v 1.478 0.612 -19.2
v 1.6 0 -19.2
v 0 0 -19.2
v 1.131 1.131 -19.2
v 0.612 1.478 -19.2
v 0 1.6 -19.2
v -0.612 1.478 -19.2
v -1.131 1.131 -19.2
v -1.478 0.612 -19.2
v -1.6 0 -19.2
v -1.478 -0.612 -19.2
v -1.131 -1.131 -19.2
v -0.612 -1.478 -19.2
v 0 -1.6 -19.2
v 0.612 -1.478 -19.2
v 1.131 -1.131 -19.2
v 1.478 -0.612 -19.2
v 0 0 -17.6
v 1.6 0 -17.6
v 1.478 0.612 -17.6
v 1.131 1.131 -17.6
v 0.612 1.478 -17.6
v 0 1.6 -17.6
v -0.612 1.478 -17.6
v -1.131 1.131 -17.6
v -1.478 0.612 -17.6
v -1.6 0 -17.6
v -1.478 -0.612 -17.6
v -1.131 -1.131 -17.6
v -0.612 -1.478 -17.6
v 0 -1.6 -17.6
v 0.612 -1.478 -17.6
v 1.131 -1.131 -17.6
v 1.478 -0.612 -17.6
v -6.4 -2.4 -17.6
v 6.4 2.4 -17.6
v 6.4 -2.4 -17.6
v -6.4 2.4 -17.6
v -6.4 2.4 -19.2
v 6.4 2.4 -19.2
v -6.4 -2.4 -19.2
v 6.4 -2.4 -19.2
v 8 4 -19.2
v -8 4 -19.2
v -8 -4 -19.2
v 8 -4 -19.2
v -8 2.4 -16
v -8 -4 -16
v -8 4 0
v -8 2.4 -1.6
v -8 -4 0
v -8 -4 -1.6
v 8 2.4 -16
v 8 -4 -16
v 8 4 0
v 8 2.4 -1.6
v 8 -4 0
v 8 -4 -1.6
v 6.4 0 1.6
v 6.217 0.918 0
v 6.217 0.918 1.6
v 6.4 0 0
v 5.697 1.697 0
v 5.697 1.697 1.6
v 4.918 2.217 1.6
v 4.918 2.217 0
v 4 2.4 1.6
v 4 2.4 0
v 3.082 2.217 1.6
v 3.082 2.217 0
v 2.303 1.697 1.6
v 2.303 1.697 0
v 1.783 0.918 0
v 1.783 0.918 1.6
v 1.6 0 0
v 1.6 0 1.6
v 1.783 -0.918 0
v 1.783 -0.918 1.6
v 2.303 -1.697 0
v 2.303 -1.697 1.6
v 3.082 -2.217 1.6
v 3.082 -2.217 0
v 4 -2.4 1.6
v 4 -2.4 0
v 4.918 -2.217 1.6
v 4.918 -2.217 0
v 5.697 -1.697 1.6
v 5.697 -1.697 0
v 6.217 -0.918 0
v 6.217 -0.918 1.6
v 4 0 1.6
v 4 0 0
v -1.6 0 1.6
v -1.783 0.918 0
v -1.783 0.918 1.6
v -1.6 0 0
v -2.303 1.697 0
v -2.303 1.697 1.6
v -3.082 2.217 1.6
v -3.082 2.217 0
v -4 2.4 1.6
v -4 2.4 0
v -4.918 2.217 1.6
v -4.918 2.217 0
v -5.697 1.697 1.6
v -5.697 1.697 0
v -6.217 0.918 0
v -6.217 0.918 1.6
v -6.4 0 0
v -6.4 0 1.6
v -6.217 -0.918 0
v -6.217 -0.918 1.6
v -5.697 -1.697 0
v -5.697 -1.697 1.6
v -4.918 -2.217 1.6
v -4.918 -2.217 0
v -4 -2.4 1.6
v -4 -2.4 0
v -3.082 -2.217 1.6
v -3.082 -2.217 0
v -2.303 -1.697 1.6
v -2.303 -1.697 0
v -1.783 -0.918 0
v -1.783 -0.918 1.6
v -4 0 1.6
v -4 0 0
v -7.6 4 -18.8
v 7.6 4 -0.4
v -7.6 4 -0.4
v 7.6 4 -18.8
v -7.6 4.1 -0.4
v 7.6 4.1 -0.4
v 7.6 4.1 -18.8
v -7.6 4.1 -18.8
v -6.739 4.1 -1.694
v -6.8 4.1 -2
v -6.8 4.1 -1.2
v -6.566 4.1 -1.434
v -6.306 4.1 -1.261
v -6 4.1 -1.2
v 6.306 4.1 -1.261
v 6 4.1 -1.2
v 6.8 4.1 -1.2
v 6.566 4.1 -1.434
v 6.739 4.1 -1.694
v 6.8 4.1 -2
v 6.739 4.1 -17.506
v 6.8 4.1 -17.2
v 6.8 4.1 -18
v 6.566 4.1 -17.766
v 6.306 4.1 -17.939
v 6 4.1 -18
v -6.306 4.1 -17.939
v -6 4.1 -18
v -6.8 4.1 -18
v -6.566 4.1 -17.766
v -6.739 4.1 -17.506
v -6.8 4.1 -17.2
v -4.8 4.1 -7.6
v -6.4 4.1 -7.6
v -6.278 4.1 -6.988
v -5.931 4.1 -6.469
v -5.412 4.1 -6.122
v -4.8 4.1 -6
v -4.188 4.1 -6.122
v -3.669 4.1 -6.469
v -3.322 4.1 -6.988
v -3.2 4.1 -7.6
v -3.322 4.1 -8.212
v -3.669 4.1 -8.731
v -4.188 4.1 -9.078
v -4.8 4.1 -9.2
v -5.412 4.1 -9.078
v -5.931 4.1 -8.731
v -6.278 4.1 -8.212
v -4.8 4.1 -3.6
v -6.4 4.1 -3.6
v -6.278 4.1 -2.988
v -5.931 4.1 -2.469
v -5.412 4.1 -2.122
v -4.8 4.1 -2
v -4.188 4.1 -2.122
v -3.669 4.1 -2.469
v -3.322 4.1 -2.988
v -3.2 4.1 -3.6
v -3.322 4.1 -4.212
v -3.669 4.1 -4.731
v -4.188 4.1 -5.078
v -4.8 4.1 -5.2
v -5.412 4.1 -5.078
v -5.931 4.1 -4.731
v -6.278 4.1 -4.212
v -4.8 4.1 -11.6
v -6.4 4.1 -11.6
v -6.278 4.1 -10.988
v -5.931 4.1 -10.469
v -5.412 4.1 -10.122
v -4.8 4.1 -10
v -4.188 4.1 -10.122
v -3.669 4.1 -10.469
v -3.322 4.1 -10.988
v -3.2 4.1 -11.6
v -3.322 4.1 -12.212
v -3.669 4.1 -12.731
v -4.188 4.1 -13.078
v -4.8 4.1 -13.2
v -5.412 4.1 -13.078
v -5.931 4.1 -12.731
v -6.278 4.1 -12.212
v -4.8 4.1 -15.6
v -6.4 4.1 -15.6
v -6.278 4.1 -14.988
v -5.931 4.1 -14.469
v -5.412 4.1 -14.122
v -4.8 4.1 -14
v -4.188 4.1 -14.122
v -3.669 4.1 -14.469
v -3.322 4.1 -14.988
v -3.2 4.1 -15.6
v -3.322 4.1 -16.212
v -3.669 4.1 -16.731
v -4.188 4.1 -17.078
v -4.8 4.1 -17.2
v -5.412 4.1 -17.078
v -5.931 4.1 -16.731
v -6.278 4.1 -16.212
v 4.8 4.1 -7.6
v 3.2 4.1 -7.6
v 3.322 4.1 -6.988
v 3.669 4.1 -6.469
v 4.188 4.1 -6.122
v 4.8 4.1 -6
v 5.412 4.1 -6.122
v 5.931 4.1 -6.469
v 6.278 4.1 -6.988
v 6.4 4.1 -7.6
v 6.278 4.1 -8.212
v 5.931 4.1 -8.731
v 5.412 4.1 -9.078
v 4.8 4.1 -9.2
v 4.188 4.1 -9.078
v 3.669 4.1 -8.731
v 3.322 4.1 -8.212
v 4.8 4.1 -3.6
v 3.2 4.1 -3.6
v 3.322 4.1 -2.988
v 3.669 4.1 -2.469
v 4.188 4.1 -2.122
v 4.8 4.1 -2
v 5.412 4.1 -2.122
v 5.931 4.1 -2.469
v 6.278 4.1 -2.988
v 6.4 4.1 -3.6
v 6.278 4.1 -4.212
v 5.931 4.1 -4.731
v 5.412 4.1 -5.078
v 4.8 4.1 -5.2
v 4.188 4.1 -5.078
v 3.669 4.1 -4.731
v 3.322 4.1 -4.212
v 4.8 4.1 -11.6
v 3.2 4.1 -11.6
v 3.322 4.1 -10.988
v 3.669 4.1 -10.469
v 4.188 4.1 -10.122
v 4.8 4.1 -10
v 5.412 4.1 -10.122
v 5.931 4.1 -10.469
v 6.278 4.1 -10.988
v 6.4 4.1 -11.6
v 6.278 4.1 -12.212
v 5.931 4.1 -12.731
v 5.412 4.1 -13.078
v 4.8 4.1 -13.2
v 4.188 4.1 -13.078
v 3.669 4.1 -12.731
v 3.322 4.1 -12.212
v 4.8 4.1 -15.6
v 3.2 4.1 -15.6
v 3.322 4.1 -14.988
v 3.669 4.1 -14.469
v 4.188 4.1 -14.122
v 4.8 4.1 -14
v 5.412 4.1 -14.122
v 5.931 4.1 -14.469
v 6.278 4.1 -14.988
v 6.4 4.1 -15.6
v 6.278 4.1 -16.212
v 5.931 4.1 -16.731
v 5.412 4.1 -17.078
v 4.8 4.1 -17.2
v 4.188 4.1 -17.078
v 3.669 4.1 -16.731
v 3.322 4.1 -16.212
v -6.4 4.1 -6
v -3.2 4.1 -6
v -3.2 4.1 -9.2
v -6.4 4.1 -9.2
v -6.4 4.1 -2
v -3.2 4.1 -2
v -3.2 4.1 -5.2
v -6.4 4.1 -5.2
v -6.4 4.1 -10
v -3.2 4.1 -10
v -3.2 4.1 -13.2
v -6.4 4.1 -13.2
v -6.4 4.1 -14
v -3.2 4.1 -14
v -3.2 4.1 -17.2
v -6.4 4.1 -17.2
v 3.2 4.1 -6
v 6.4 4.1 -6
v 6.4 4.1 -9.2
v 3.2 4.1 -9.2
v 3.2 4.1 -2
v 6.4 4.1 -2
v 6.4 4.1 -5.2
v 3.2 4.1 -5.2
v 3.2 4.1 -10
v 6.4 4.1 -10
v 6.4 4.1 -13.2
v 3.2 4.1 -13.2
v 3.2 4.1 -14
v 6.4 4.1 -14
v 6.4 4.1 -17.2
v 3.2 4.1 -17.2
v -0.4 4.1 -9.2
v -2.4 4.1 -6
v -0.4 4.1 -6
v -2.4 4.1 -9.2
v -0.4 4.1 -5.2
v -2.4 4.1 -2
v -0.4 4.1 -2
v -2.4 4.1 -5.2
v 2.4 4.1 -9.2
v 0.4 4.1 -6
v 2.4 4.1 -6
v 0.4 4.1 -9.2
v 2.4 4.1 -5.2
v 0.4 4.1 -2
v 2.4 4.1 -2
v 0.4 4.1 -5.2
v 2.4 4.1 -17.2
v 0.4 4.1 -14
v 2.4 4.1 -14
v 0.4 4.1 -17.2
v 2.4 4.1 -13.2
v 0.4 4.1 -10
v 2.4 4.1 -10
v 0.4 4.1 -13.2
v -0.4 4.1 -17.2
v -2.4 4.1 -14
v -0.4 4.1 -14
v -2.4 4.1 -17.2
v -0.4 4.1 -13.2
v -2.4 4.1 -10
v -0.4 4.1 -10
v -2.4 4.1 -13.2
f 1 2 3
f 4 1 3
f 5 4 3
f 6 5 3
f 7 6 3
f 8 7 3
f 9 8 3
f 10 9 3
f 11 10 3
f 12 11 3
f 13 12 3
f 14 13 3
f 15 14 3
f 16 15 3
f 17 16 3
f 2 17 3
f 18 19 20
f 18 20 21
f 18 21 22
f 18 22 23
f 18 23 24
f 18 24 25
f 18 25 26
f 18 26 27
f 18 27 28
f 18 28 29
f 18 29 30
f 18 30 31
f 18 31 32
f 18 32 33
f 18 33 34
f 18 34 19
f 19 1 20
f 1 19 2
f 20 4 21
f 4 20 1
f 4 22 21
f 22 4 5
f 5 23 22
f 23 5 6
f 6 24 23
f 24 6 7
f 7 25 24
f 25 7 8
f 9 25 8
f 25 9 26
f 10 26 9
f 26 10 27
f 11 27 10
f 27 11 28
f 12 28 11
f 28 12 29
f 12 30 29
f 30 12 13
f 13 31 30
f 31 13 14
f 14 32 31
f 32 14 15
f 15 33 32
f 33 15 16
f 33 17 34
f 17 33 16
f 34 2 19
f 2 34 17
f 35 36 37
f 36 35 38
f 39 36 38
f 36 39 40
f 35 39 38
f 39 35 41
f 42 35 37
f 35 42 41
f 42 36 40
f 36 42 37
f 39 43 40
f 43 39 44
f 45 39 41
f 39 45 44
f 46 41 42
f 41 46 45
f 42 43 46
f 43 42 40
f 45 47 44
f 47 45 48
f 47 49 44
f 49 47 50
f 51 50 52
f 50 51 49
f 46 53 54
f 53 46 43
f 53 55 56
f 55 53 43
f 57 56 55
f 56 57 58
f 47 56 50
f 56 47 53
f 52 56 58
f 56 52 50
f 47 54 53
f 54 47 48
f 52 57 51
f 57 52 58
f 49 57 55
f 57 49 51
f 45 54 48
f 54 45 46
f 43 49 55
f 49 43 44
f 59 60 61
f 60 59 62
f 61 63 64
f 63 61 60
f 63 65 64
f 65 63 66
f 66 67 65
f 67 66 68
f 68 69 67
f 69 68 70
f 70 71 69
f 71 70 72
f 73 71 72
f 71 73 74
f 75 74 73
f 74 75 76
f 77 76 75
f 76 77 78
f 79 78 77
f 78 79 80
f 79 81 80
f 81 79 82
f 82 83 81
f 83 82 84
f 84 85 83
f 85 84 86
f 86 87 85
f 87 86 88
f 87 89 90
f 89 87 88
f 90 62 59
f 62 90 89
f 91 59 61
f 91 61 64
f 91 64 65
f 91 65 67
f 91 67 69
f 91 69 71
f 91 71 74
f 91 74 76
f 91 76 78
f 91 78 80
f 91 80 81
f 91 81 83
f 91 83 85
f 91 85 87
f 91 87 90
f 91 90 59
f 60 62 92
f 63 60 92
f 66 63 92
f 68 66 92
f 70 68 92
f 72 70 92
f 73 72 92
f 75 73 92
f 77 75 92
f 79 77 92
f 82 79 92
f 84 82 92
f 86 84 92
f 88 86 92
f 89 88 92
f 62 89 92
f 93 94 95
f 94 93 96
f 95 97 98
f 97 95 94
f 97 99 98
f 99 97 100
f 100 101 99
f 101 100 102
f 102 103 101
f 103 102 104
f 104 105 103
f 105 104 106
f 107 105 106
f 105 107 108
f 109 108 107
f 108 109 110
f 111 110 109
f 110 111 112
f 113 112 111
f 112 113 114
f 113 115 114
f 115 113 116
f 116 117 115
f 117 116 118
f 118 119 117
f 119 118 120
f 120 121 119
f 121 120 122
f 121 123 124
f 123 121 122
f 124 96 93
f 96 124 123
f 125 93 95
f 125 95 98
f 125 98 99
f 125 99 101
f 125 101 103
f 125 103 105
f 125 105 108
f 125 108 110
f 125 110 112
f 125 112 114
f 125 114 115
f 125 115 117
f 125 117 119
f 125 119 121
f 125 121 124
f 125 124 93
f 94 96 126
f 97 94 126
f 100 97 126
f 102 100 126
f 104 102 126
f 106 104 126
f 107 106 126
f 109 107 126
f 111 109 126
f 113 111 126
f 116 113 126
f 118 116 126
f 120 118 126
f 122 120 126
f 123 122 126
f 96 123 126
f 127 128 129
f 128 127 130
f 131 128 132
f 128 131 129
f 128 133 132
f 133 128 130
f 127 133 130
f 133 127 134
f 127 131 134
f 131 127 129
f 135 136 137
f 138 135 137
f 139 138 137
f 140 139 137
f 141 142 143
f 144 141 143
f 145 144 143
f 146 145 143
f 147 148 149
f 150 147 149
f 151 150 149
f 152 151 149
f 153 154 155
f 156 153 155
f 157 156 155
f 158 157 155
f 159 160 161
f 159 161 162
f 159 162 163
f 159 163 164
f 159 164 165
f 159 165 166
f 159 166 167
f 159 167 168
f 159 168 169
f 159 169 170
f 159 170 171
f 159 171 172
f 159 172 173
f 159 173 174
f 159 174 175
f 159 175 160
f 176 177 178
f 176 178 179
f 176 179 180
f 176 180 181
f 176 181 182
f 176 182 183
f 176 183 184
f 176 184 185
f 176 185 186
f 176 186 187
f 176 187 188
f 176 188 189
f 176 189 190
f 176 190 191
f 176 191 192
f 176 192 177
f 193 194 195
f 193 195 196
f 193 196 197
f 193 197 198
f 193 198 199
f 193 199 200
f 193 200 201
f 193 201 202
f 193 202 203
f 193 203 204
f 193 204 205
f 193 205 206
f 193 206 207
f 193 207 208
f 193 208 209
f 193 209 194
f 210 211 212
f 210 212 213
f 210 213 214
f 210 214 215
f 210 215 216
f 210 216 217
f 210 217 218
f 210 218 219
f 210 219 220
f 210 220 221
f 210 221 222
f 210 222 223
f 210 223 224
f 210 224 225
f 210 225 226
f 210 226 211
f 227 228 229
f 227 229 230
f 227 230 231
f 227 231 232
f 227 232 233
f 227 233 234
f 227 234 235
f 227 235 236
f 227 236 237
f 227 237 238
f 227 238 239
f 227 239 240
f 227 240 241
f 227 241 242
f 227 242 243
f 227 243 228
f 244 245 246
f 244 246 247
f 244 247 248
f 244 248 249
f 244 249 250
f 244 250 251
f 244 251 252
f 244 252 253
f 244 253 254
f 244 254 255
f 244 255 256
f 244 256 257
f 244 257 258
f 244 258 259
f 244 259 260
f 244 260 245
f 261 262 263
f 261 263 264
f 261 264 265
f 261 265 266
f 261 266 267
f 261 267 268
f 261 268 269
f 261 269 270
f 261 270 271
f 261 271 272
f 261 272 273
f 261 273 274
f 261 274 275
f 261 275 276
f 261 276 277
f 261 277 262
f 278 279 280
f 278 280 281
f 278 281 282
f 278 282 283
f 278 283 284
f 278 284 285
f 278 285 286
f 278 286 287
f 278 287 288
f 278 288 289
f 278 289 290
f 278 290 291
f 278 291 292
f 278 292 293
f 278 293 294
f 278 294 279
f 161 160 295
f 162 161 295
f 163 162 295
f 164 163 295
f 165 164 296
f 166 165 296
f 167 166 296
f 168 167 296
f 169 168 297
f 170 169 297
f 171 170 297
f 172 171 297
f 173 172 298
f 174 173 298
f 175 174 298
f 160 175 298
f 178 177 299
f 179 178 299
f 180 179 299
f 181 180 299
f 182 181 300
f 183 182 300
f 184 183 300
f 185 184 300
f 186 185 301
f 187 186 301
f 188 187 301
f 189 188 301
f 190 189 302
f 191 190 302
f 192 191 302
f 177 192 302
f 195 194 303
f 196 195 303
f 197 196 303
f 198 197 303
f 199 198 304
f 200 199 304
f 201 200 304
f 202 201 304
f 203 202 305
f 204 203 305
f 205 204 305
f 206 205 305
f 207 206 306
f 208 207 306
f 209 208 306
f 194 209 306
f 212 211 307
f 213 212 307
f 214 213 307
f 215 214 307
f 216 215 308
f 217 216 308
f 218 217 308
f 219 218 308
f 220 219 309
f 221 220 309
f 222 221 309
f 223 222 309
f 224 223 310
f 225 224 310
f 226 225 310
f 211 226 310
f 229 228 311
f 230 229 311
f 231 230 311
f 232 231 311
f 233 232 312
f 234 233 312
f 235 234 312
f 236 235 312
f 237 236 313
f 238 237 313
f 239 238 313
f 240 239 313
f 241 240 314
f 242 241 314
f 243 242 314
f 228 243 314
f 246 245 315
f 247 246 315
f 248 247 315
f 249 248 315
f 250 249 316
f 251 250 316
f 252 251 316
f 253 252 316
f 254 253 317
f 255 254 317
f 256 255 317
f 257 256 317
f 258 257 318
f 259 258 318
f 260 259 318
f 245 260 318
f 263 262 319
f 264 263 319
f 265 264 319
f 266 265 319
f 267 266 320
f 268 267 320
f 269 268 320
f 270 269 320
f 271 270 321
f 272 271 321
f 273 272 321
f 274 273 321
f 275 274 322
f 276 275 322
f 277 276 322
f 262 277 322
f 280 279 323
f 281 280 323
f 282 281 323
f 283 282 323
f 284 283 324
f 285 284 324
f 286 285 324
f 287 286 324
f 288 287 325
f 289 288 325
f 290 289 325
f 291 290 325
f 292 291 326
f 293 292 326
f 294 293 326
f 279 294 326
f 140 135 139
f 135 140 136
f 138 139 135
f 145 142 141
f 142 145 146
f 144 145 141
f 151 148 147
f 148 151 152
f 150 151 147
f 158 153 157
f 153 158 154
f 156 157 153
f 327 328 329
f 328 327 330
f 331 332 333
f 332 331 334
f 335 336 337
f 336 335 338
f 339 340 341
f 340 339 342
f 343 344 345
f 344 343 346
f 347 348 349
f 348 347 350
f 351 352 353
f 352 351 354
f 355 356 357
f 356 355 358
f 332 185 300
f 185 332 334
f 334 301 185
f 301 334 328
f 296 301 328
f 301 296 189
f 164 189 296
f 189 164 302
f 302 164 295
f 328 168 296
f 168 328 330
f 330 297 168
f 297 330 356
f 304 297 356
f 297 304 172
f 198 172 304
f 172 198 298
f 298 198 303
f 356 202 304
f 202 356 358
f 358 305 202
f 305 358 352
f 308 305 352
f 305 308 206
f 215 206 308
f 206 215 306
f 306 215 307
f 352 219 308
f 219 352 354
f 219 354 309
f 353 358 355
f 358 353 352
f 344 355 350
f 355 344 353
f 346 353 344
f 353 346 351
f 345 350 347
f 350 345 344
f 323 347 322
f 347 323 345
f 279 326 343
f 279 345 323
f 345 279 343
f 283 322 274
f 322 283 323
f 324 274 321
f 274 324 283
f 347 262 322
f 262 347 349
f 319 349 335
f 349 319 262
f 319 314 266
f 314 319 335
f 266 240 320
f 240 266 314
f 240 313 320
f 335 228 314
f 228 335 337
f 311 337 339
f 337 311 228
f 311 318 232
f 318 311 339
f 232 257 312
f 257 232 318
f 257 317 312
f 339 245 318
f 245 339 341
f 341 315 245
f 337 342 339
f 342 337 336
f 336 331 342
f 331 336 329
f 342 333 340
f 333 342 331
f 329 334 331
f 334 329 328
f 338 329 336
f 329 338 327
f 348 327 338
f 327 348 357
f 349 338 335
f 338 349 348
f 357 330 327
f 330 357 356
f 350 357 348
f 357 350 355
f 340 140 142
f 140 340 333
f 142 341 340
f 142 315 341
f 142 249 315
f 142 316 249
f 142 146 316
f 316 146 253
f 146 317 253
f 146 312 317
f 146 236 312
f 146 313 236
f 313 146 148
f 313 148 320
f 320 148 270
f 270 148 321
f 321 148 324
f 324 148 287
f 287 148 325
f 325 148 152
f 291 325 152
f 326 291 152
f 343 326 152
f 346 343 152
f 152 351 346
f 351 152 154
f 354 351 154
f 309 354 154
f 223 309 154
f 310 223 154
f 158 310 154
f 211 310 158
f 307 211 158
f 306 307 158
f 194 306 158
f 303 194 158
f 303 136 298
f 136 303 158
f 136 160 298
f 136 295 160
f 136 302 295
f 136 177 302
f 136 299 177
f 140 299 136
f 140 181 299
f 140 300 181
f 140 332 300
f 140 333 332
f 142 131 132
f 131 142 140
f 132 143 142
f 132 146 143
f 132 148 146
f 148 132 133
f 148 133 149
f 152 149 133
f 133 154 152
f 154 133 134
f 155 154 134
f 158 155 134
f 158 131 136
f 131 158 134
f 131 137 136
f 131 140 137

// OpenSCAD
// file: ../p/4-4edge.scad
use <../lib.scad>
function ldraw_lib__4_4edge() = [
// 0 Circle 1.0
// 0 Name: 4-4edge.dat
// 0 Author: James Jessiman
// 0 !LDRAW_ORG Primitive UPDATE 2017-01
// 0 !LICENSE Licensed under CC BY 2.0 and CC BY 4.0 : see CAreadme.txt
// 
// 0 BFC CERTIFY CCW
  [0,"BFC","CERTIFY"],
  [0,"BFC","CCW"],
// 
// 0 !HISTORY 1998-12-15 [PTadmin] Official Update 1998-10
// 0 !HISTORY 2005-12-28 [PTadmin] Official Update 2005-01
// 0 !HISTORY 2007-06-24 [PTadmin] Header formatted for Contributor Agreement
// 0 !HISTORY 2008-07-01 [PTadmin] Official Update 2008-01
// 0 !HISTORY 2017-01-15 [Steffen] BFCed
// 0 !HISTORY 2017-12-30 [PTadmin] Official Update 2017-01
// 
// 
// 2 24 1 0 0 0.9239 0 0.3827
  [2,24,1,0,0,0.9239,0,0.3827],
// 2 24 0.9239 0 0.3827 0.7071 0 0.7071
  [2,24,0.9239,0,0.3827,0.7071,0,0.7071],
// 2 24 0.7071 0 0.7071 0.3827 0 0.9239
  [2,24,0.7071,0,0.7071,0.3827,0,0.9239],
// 2 24 0.3827 0 0.9239 0 0 1
  [2,24,0.3827,0,0.9239,0,0,1],
// 2 24 0 0 1 -0.3827 0 0.9239
  [2,24,0,0,1,-0.3827,0,0.9239],
// 2 24 -0.3827 0 0.9239 -0.7071 0 0.7071
  [2,24,-0.3827,0,0.9239,-0.7071,0,0.7071],
// 2 24 -0.7071 0 0.7071 -0.9239 0 0.3827
  [2,24,-0.7071,0,0.7071,-0.9239,0,0.3827],
// 2 24 -0.9239 0 0.3827 -1 0 -0
  [2,24,-0.9239,0,0.3827,-1,0,-0],
// 2 24 -1 0 -0 -0.9239 0 -0.3827
  [2,24,-1,0,-0,-0.9239,0,-0.3827],
// 2 24 -0.9239 0 -0.3827 -0.7071 0 -0.7071
  [2,24,-0.9239,0,-0.3827,-0.7071,0,-0.7071],
// 2 24 -0.7071 0 -0.7071 -0.3827 0 -0.9239
  [2,24,-0.7071,0,-0.7071,-0.3827,0,-0.9239],
// 2 24 -0.3827 0 -0.9239 0 0 -1
  [2,24,-0.3827,0,-0.9239,0,0,-1],
// 2 24 0 0 -1 0.3827 0 -0.9239
  [2,24,0,0,-1,0.3827,0,-0.9239],
// 2 24 0.3827 0 -0.9239 0.7071 0 -0.7071
  [2,24,0.3827,0,-0.9239,0.7071,0,-0.7071],
// 2 24 0.7071 0 -0.7071 0.9239 0 -0.3827
  [2,24,0.7071,0,-0.7071,0.9239,0,-0.3827],
// 2 24 0.9239 0 -0.3827 1 0 0
  [2,24,0.9239,0,-0.3827,1,0,0],
];
module ldraw_lib__4_4edge(step=0, col=false, unit=2/5, alt=false, line=0.2, solid=!$preview)
    makepoly(ldraw_lib__4_4edge(), step=step, col=col, unit=unit, alt=alt, line=line, solid=solid);
ldraw_lib__4_4edge(line=0.2);
// file: ../p/4-4cyli.scad
use <../lib.scad>
$fa=1; $fs=0.2;
function ldraw_lib__4_4cyli(realsolid=false) = [
// 0 Cylinder 1.0
// 0 Name: 4-4cyli.dat
// 0 Author: James Jessiman
// 0 !LDRAW_ORG Primitive UPDATE 2005-01
// 0 !LICENSE Licensed under CC BY 2.0 and CC BY 4.0 : see CAreadme.txt
// 
// 0 BFC CERTIFY CCW
  [0,"BFC","CERTIFY"],
  [0,"BFC","CCW"],
// 
// 0 !HISTORY 1998-12-15 [PTadmin] Official Update 1998-10
// 0 !HISTORY 2002-03-23 [sbliss] Added BFC statement; merged headers from files in distributions LDraw 0.27 and Complete.
// 0 !HISTORY 2002-04-25 [PTadmin] Official Update 2002-02
// 0 !HISTORY 2004-12-14 [guyvivan] BFC CCW
// 0 !HISTORY 2005-12-28 [PTadmin] Official Update 2005-01
// 0 !HISTORY 2007-06-24 [PTadmin] Header formatted for Contributor Agreement
// 0 !HISTORY 2008-07-01 [PTadmin] Official Update 2008-01
// 
// 
// 4 16 1 1 0 0.9239 1 0.3827 0.9239 0 0.3827 1 0 0
  [4,16,1,1,0,0.9239,1,0.3827,0.9239,0,0.3827,1,0,0],
// 5 24 1 0 0 1 1 0 0.9239 0 0.3827 0.9239 0 -0.3827
  [5,24,1,0,0,1,1,0,0.9239,0,0.3827,0.9239,0,-0.3827],
// 4 16 0.9239 1 0.3827 0.7071 1 0.7071 0.7071 0 0.7071 0.9239 0 0.3827
  [4,16,0.9239,1,0.3827,0.7071,1,0.7071,0.7071,0,0.7071,0.9239,0,0.3827],
// 5 24 0.9239 0 0.3827 0.9239 1 0.3827 0.7071 0 0.7071 1 0 0
  [5,24,0.9239,0,0.3827,0.9239,1,0.3827,0.7071,0,0.7071,1,0,0],
// 4 16 0.7071 1 0.7071 0.3827 1 0.9239 0.3827 0 0.9239 0.7071 0 0.7071
  [4,16,0.7071,1,0.7071,0.3827,1,0.9239,0.3827,0,0.9239,0.7071,0,0.7071],
// 5 24 0.7071 0 0.7071 0.7071 1 0.7071 0.3827 0 0.9239 0.9239 0 0.3827
  [5,24,0.7071,0,0.7071,0.7071,1,0.7071,0.3827,0,0.9239,0.9239,0,0.3827],
// 4 16 0.3827 1 0.9239 0 1 1 0 0 1 0.3827 0 0.9239
  [4,16,0.3827,1,0.9239,0,1,1,0,0,1,0.3827,0,0.9239],
// 5 24 0.3827 0 0.9239 0.3827 1 0.9239 0 0 1 0.7071 0 0.7071
  [5,24,0.3827,0,0.9239,0.3827,1,0.9239,0,0,1,0.7071,0,0.7071],
// 4 16 0 1 1 -0.3827 1 0.9239 -0.3827 0 0.9239 0 0 1
  [4,16,0,1,1,-0.3827,1,0.9239,-0.3827,0,0.9239,0,0,1],
// 5 24 0 0 1 0 1 1 -0.3827 0 0.9239 0.3827 0 0.9239
  [5,24,0,0,1,0,1,1,-0.3827,0,0.9239,0.3827,0,0.9239],
// 4 16 -0.3827 1 0.9239 -0.7071 1 0.7071 -0.7071 0 0.7071 -0.3827 0 0.9239
  [4,16,-0.3827,1,0.9239,-0.7071,1,0.7071,-0.7071,0,0.7071,-0.3827,0,0.9239],
// 5 24 -0.3827 0 0.9239 -0.3827 1 0.9239 -0.7071 0 0.7071 0 0 1
  [5,24,-0.3827,0,0.9239,-0.3827,1,0.9239,-0.7071,0,0.7071,0,0,1],
// 4 16 -0.7071 1 0.7071 -0.9239 1 0.3827 -0.9239 0 0.3827 -0.7071 0 0.7071
  [4,16,-0.7071,1,0.7071,-0.9239,1,0.3827,-0.9239,0,0.3827,-0.7071,0,0.7071],
// 5 24 -0.7071 0 0.7071 -0.7071 1 0.7071 -0.9239 0 0.3827 -0.3827 0 0.9239
  [5,24,-0.7071,0,0.7071,-0.7071,1,0.7071,-0.9239,0,0.3827,-0.3827,0,0.9239],
// 4 16 -0.9239 1 0.3827 -1 1 0 -1 0 0 -0.9239 0 0.3827
  [4,16,-0.9239,1,0.3827,-1,1,0,-1,0,0,-0.9239,0,0.3827],
// 5 24 -0.9239 0 0.3827 -0.9239 1 0.3827 -1 0 0 -0.7071 0 0.7071
  [5,24,-0.9239,0,0.3827,-0.9239,1,0.3827,-1,0,0,-0.7071,0,0.7071],
// 4 16 -1 1 0 -0.9239 1 -0.3827 -0.9239 0 -0.3827 -1 0 0
  [4,16,-1,1,0,-0.9239,1,-0.3827,-0.9239,0,-0.3827,-1,0,0],
// 5 24 -1 0 0 -1 1 0 -0.9239 0 -0.3827 -0.9239 0 0.3827
  [5,24,-1,0,0,-1,1,0,-0.9239,0,-0.3827,-0.9239,0,0.3827],
// 4 16 -0.9239 1 -0.3827 -0.7071 1 -0.7071 -0.7071 0 -0.7071 -0.9239 0 -0.3827
  [4,16,-0.9239,1,-0.3827,-0.7071,1,-0.7071,-0.7071,0,-0.7071,-0.9239,0,-0.3827],
// 5 24 -0.9239 0 -0.3827 -0.9239 1 -0.3827 -0.7071 0 -0.7071 -1 0 0
  [5,24,-0.9239,0,-0.3827,-0.9239,1,-0.3827,-0.7071,0,-0.7071,-1,0,0],
// 4 16 -0.7071 1 -0.7071 -0.3827 1 -0.9239 -0.3827 0 -0.9239 -0.7071 0 -0.7071
  [4,16,-0.7071,1,-0.7071,-0.3827,1,-0.9239,-0.3827,0,-0.9239,-0.7071,0,-0.7071],
// 5 24 -0.7071 0 -0.7071 -0.7071 1 -0.7071 -0.3827 0 -0.9239 -0.9239 0 -0.3827
  [5,24,-0.7071,0,-0.7071,-0.7071,1,-0.7071,-0.3827,0,-0.9239,-0.9239,0,-0.3827],
// 4 16 -0.3827 1 -0.9239 0 1 -1 0 0 -1 -0.3827 0 -0.9239
  [4,16,-0.3827,1,-0.9239,0,1,-1,0,0,-1,-0.3827,0,-0.9239],
// 5 24 -0.3827 0 -0.9239 -0.3827 1 -0.9239 0 0 -1 -0.7071 0 -0.7071
  [5,24,-0.3827,0,-0.9239,-0.3827,1,-0.9239,0,0,-1,-0.7071,0,-0.7071],
// 4 16 0 1 -1 0.3827 1 -0.9239 0.3827 0 -0.9239 0 0 -1
  [4,16,0,1,-1,0.3827,1,-0.9239,0.3827,0,-0.9239,0,0,-1],
// 5 24 0 0 -1 0 1 -1 0.3827 0 -0.9239 -0.3827 0 -0.9239
  [5,24,0,0,-1,0,1,-1,0.3827,0,-0.9239,-0.3827,0,-0.9239],
// 4 16 0.3827 1 -0.9239 0.7071 1 -0.7071 0.7071 0 -0.7071 0.3827 0 -0.9239
  [4,16,0.3827,1,-0.9239,0.7071,1,-0.7071,0.7071,0,-0.7071,0.3827,0,-0.9239],
// 5 24 0.3827 0 -0.9239 0.3827 1 -0.9239 0.7071 0 -0.7071 0 0 -1
  [5,24,0.3827,0,-0.9239,0.3827,1,-0.9239,0.7071,0,-0.7071,0,0,-1],
// 4 16 0.7071 1 -0.7071 0.9239 1 -0.3827 0.9239 0 -0.3827 0.7071 0 -0.7071
  [4,16,0.7071,1,-0.7071,0.9239,1,-0.3827,0.9239,0,-0.3827,0.7071,0,-0.7071],
// 5 24 0.7071 0 -0.7071 0.7071 1 -0.7071 0.9239 0 -0.3827 0.3827 0 -0.9239
  [5,24,0.7071,0,-0.7071,0.7071,1,-0.7071,0.9239,0,-0.3827,0.3827,0,-0.9239],
// 4 16 0.9239 1 -0.3827 1 1 0 1 0 0 0.9239 0 -0.3827
  [4,16,0.9239,1,-0.3827,1,1,0,1,0,0,0.9239,0,-0.3827],
// 5 24 0.9239 0 -0.3827 0.9239 1 -0.3827 1 0 0 0.7071 0 -0.7071
  [5,24,0.9239,0,-0.3827,0.9239,1,-0.3827,1,0,0,0.7071,0,-0.7071],
// 0
];
module ldraw_lib__4_4cyli(step=0, col=false, unit=2/5, alt=false, line=0.2, solid=!$preview)
    makepoly(ldraw_lib__4_4cyli(solid), step=step, col=col, unit=unit, alt=alt, line=line, solid=solid);
ldraw_lib__4_4cyli(line=0.2);
// file: ../p/stud3.scad
use <../lib.scad>
use <4-4cyli.scad>
use <4-4disc.scad>
use <4-4edge.scad>
function ldraw_lib__stud3() = [
// 0 Stud Tube Solid
// 0 Name: stud3.dat
// 0 Author: James Jessiman
// 0 !LDRAW_ORG Primitive UPDATE 2012-01
// 0 !LICENSE Licensed under CC BY 4.0 : see CAreadme.txt
// 
// 0 BFC CERTIFY CCW
  [0,"BFC","CERTIFY"],
  [0,"BFC","CCW"],
// 
// 0 !HISTORY 2002-04-04 [sbliss] Modified for BFC compliance
// 0 !HISTORY 2002-04-25 [PTadmin] Official Update 2002-02
// 0 !HISTORY 2007-06-24 [PTadmin] Header formatted for Contributor Agreement
// 0 !HISTORY 2008-07-01 [PTadmin] Official Update 2008-01
// 0 !HISTORY 2012-02-16 [Philo] Changed to CCW
// 0 !HISTORY 2012-03-30 [PTadmin] Official Update 2012-01
// 
// 
// 1 16 0 -4 0 4 0 0 0 1 0 0 0 4 4-4edge.dat
  [1,16,0,-4,0,4,0,0,0,1,0,0,0,4, ldraw_lib__4_4edge()],
// 1 16 0 0 0 4 0 0 0 1 0 0 0 4 4-4edge.dat
  [1,16,0,0,0,4,0,0,0,1,0,0,0,4, ldraw_lib__4_4edge()],
// 1 16 0 -4 0 4 0 0 0 1 0 0 0 4 4-4disc.dat
  [1,16,0,-4,0,4,0,0,0,1,0,0,0,4, ldraw_lib__4_4disc()],
  [-1,16,0,0,0,4,0,0,0,-1,0,0,0,4, ldraw_lib__4_4disc()],
// 1 16 0 -4 0 4 0 0 0 4 0 0 0 4 4-4cyli.dat
  [1,16,0,-4,0,4,0,0,0,4,0,0,0,4, ldraw_lib__4_4cyli()],
];
module ldraw_lib__stud3(step=0, col=false, unit=2/5, alt=false, line=0.2, solid=!$preview)
    makepoly(ldraw_lib__stud3(), step=step, col=col, unit=unit, alt=alt, line=line, solid=solid);
ldraw_lib__stud3(line=0.2);
// file: ../p/rect3.scad
use <../lib.scad>
function ldraw_lib__rect3() = [
// 0 Rectangle with 3 Edges
// 0 Name: rect3.dat
// 0 Author: Mark Kennedy [mkennedy]
// 0 !LDRAW_ORG Primitive UPDATE 2010-01
// 0 !LICENSE Licensed under CC BY 4.0 : see CAreadme.txt
// 
// 0 BFC CERTIFY CCW
  [0,"BFC","CERTIFY"],
  [0,"BFC","CCW"],
// 
// 0 !HISTORY 2003-08-01 [PTadmin] Official Update 2003-02
// 0 !HISTORY 2007-06-24 [PTadmin] Header formatted for Contributor Agreement
// 0 !HISTORY 2008-07-01 [PTadmin] Official Update 2008-01
// 0 !HISTORY 2010-01-17 [mikeheide] Change winding to CCW
// 0 !HISTORY 2010-04-05 [PTadmin] Official Update 2010-01
// 
// 
// 2 24 1 0 1 -1 0 1
  [2,24,1,0,1,-1,0,1],
// 2 24 1 0 1 1 0 -1
  [2,24,1,0,1,1,0,-1],
// 2 24 -1 0 1 -1 0 -1
  [2,24,-1,0,1,-1,0,-1],
// 4 16 -1 0 1 -1 0 -1 1 0 -1 1 0 1
  [4,16,-1,0,1,-1,0,-1,1,0,-1,1,0,1],
// 0 //
];
module ldraw_lib__rect3(step=0, col=false, unit=2/5, alt=false, line=0.2, solid=!$preview)
    makepoly(ldraw_lib__rect3(), step=step, col=col, unit=unit, alt=alt, line=line, solid=solid);
ldraw_lib__rect3(line=0.2);
// file: ../p/box5.scad
use <../lib.scad>
function ldraw_lib__box5() = [
// 0 Box with 5 Faces and All Edges
// 0 Name: box5.dat
// 0 Author: James Jessiman
// 0 !LDRAW_ORG Primitive UPDATE 2012-01
// 0 !LICENSE Licensed under CC BY 2.0 and CC BY 4.0 : see CAreadme.txt
// 
// 0 BFC CERTIFY CCW
  [0,"BFC","CERTIFY"],
  [0,"BFC","CCW"],
// 
// 0 !HISTORY 2002-04-03 [sbliss] Modified for BFC compliance
// 0 !HISTORY 2002-04-25 [PTadmin] Official Update 2002-02
// 0 !HISTORY 2007-06-24 [PTadmin] Header formatted for Contributor Agreement
// 0 !HISTORY 2008-07-01 [PTadmin] Official Update 2008-01
// 0 !HISTORY 2012-02-16 [Philo] Changed to CCW
// 0 !HISTORY 2012-03-30 [PTadmin] Official Update 2012-01
// 
// 
// 2 24 1 1 1 -1 1 1
  [2,24,1,1,1,-1,1,1],
// 2 24 -1 1 1 -1 1 -1
  [2,24,-1,1,1,-1,1,-1],
// 2 24 -1 1 -1 1 1 -1
  [2,24,-1,1,-1,1,1,-1],
// 2 24 1 1 -1 1 1 1
  [2,24,1,1,-1,1,1,1],
// 2 24 1 0 1 -1 0 1
  [2,24,1,0,1,-1,0,1],
// 2 24 -1 0 1 -1 0 -1
  [2,24,-1,0,1,-1,0,-1],
// 2 24 -1 0 -1 1 0 -1
  [2,24,-1,0,-1,1,0,-1],
// 2 24 1 0 -1 1 0 1
  [2,24,1,0,-1,1,0,1],
// 2 24 1 0 1 1 1 1
  [2,24,1,0,1,1,1,1],
// 2 24 -1 0 1 -1 1 1
  [2,24,-1,0,1,-1,1,1],
// 2 24 1 0 -1 1 1 -1
  [2,24,1,0,-1,1,1,-1],
// 2 24 -1 0 -1 -1 1 -1
  [2,24,-1,0,-1,-1,1,-1],
// 4 16 -1 1 1 1 1 1 1 1 -1 -1 1 -1
  [4,16,-1,1,1,1,1,1,1,1,-1,-1,1,-1],
// 4 16 -1 1 1 -1 0 1 1 0 1 1 1 1
  [4,16,-1,1,1,-1,0,1,1,0,1,1,1,1],
// 4 16 -1 1 -1 -1 0 -1 -1 0 1 -1 1 1
  [4,16,-1,1,-1,-1,0,-1,-1,0,1,-1,1,1],
// 4 16 1 1 -1 1 0 -1 -1 0 -1 -1 1 -1
  [4,16,1,1,-1,1,0,-1,-1,0,-1,-1,1,-1],
// 4 16 1 1 1 1 0 1 1 0 -1 1 1 -1
  [4,16,1,1,1,1,0,1,1,0,-1,1,1,-1],
];
makepoly(ldraw_lib__box5(), line=0.2);
// file: ../p/box3u2p.scad
use <../lib.scad>
function ldraw_lib__box3u2p() = [
// 0 Box with 3 Faces without 2 Parallel Edges
// 0 Name: box3u2p.dat
// 0 Author: Niels Karsdorp [nielsk]
// 0 !LDRAW_ORG Primitive UPDATE 2012-01
// 0 !LICENSE Licensed under CC BY 2.0 and CC BY 4.0 : see CAreadme.txt
// 
// 0 BFC CERTIFY CCW
  [0,"BFC","CERTIFY"],
  [0,"BFC","CCW"],
// 
// 0 !HISTORY 2003-03-12 [PTadmin] Official Update 2003-01
// 0 !HISTORY 2007-06-24 [PTadmin] Header formatted for Contributor Agreement
// 0 !HISTORY 2008-07-01 [PTadmin] Official Update 2008-01
// 0 !HISTORY 2012-02-16 [Philo] Changed to CCW
// 0 !HISTORY 2012-03-30 [PTadmin] Official Update 2012-01
// 
// 
// 2 24 1 1 1 -1 1 1
  [2,24,1,1,1,-1,1,1],
// 2 24 -1 1 -1 1 1 -1
  [2,24,-1,1,-1,1,1,-1],
// 2 24 1 0 1 -1 0 1
  [2,24,1,0,1,-1,0,1],
// 2 24 -1 0 -1 1 0 -1
  [2,24,-1,0,-1,1,0,-1],
// 2 24 1 1 1 1 1 -1
  [2,24,1,1,1,1,1,-1],
// 2 24 -1 1 1 -1 1 -1
  [2,24,-1,1,1,-1,1,-1],
// 2 24 1 1 1 1 0 1
  [2,24,1,1,1,1,0,1],
// 2 24 1 1 -1 1 0 -1
  [2,24,1,1,-1,1,0,-1],
// 2 24 -1 1 1 -1 0 1
  [2,24,-1,1,1,-1,0,1],
// 2 24 -1 1 -1 -1 0 -1
  [2,24,-1,1,-1,-1,0,-1],
// 4 16 -1 1 -1 -1 1 1 1 1 1 1 1 -1
  [4,16,-1,1,-1,-1,1,1,1,1,1,1,1,-1],
// 4 16 -1 1 1 -1 0 1 1 0 1 1 1 1
  [4,16,-1,1,1,-1,0,1,1,0,1,1,1,1],
// 4 16 1 1 -1 1 0 -1 -1 0 -1 -1 1 -1
  [4,16,1,1,-1,1,0,-1,-1,0,-1,-1,1,-1],
];
module ldraw_lib__box3u2p(step=0, col=false, unit=2/5, alt=false, line=0.2, solid=!$preview)
    makepoly(ldraw_lib__box3u2p(), step=step, col=col, unit=unit, alt=alt, line=line, solid=solid);
ldraw_lib__box3u2p(line=0.2);
// file: ../p/box2-5.scad
use <../lib.scad>
$fa=1; $fs=0.2;
function ldraw_lib__box2_5(realsolid=false) = [
// 0 Box with 2 Faces without 5 Edges
// 0 Name: box2-5.dat
// 0 Author: Steffen [Steffen]
// 0 !LDRAW_ORG Primitive UPDATE 2003-03
// 0 !LICENSE Licensed under CC BY 2.0 and CC BY 4.0 : see CAreadme.txt
// 
// 0 BFC CERTIFY CCW
  [0,"BFC","CERTIFY"],
  [0,"BFC","CCW"],
// 
// 0 !HISTORY 2003-12-19 [PTadmin] Official Update 2003-03
// 0 !HISTORY 2007-06-24 [PTadmin] Header formatted for Contributor Agreement
// 0 !HISTORY 2008-07-01 [PTadmin] Official Update 2008-01
// 
// 
// 2 24 1 1 1 -1 1 1
  [2,24,1,1,1,-1,1,1],
// 2 24 1 1 -1 -1 1 -1
  [2,24,1,1,-1,-1,1,-1],
// 2 24 1 -1 1 -1 -1 1
  [2,24,1,-1,1,-1,-1,1],
// 2 24 -1 -1 1 -1 1 1
  [2,24,-1,-1,1,-1,1,1],
// 2 24 1 -1 1 1 1 1
  [2,24,1,-1,1,1,1,1],
// 2 24 -1 1 -1 -1 1 1
  [2,24,-1,1,-1,-1,1,1],
// 2 24 1 1 -1 1 1 1
  [2,24,1,1,-1,1,1,1],
// 4 16 1 1 1 1 1 -1 -1 1 -1 -1 1 1
  [4,16,1,1,1,1,1,-1,-1,1,-1,-1,1,1],
// 4 16 1 1 1 -1 1 1 -1 -1 1 1 -1 1
  [4,16,1,1,1,-1,1,1,-1,-1,1,1,-1,1],
// 0
];
module ldraw_lib__box2_5(step=0, col=false, unit=2/5, alt=false, line=0.2, solid=!$preview)
    makepoly(ldraw_lib__box2_5(solid), step=step, col=col, unit=unit, alt=alt, line=line, solid=solid);
ldraw_lib__box2_5(line=0.2);
// file: ../p/stud.scad
use <../lib.scad>
use <4-4cyli.scad>
use <4-4disc.scad>
use <4-4edge.scad>
function ldraw_lib__stud() = [
// 0 Stud
// 0 Name: stud.dat
// 0 Author: James Jessiman
// 0 !LDRAW_ORG Primitive UPDATE 2012-01
// 0 !LICENSE Licensed under CC BY 4.0 : see CAreadme.txt
// 
// 0 BFC CERTIFY CCW
  [0,"BFC","CERTIFY"],
  [0,"BFC","CCW"],
// 
// 0 !HISTORY 2002-04-04 [sbliss] Modified for BFC compliance
// 0 !HISTORY 2002-04-25 [PTadmin] Official Update 2002-02
// 0 !HISTORY 2007-06-24 [PTadmin] Header formatted for Contributor Agreement
// 0 !HISTORY 2008-07-01 [PTadmin] Official Update 2008-01
// 0 !HISTORY 2012-02-16 [Philo] Changed to CCW
// 0 !HISTORY 2012-03-30 [PTadmin] Official Update 2012-01
// 
// 
// 1 16 0 0 0 6 0 0 0 1 0 0 0 6 4-4edge.dat
  [1,16,0,0,0,6,0,0,0,1,0,0,0,6, ldraw_lib__4_4edge()],
// 1 16 0 -4 0 6 0 0 0 1 0 0 0 6 4-4edge.dat
  [1,16,0,-4,0,6,0,0,0,1,0,0,0,6, ldraw_lib__4_4edge()],
// 1 16 0 0 0 6 0 0 0 -4 0 0 0 6 4-4cyli.dat
  [1,16,0,0,0,6,0,0,0,-4,0,0,0,6, ldraw_lib__4_4cyli()],
// 1 16 0 -4 0 6 0 0 0 1 0 0 0 6 4-4disc.dat
  [1,16,0,-4,0,6,0,0,0,1,0,0,0,6, ldraw_lib__4_4disc()],
  [-1,16,0,0,0,6,0,0,0,-1,0,0,0,6, ldraw_lib__4_4disc()],
];
module ldraw_lib__stud(step=0, col=false, unit=2/5, alt=false, line=0.2, solid=!$preview)
    makepoly(ldraw_lib__stud(), step=step, col=col, unit=unit, alt=alt, line=line, solid=solid);
ldraw_lib__stud(line=0.2);
// file: s/4864s01.scad
use <../../lib.scad>
use <../../p/box2-5.scad>
use <../../p/box3u2p.scad>
use <../../p/box5.scad>
use <../../p/rect3.scad>
use <../../p/stud3.scad>
function ldraw_lib__s__4864s01() = [
// 0 ~Panel  1 x  2 x  2 without Front Face and Studs
// 0 Name: s\4864s01.dat
// 0 Author: Mark Kennedy [mkennedy]
// 0 !LDRAW_ORG Subpart UPDATE 2004-03
// 0 !LICENSE Licensed under CC BY 4.0 : see CAreadme.txt
// 
// 0 BFC CERTIFY CCW
  [0,"BFC","CERTIFY"],
  [0,"BFC","CCW"],
// 
// 0 !HISTORY 2003-07-02 [Steffen] BFCed
// 0 !HISTORY 2004-04-22 [PTadmin] Official Update 2004-02
// 0 !HISTORY 2004-04-25 [cwdee] Restructured for solid/hollow studs
// 0 !HISTORY 2004-09-15 [PTadmin] Official Update 2004-03
// 0 !HISTORY 2007-09-10 [PTadmin] Header formatted for Contributor Agreement
// 0 !HISTORY 2008-07-01 [PTadmin] Official Update 2008-01
// 
// 
// 0 // Uncomment for decorated surface
// 0 // 4 16 -20 0 10 -20 48 10 20 48 10 20 0 10
// 0 // Uncomment for solid studs
// 0 // 1 16 10 0 0 1 0 0 0 1 0 0 0 1 stud.dat
// 0 // 1 16 -10 0 0 1 0 0 0 1 0 0 0 1 stud.dat
// 0 // Uncomment for hollow studs
// 0 // 1 16 10 0 0 1 0 0 0 1 0 0 0 1 stud2.dat
// 0 // 1 16 -10 0 0 1 0 0 0 1 0 0 0 1 stud2.dat
// 1 16 0 44 0 1 0 0 0 -1 0 0 0 1 stud3.dat
  [1,16,0,44,0,1,0,0,0,-1,0,0,0,1, ldraw_lib__stud3()],
// 0 BFC INVERTNEXT
  [0,"BFC","INVERTNEXT"],
// 1 16 0 48 0 16 0 0 0 -4 0 0 0 6 box5.dat
  [1,16,0,48,0,16,0,0,0,-4,0,0,0,6, ldraw_lib__box5()],
// 4 16 20 48 10 16 48 6 -16 48 6 -20 48 10
  [4,16,20,48,10,16,48,6,-16,48,6,-20,48,10],
// 4 16 -20 48 10 -16 48 6 -16 48 -6 -20 48 -10
  [4,16,-20,48,10,-16,48,6,-16,48,-6,-20,48,-10],
// 4 16 -20 48 -10 -16 48 -6 16 48 -6 20 48 -10
  [4,16,-20,48,-10,-16,48,-6,16,48,-6,20,48,-10],
// 4 16 20 48 -10 16 48 -6 16 48 6 20 48 10
  [4,16,20,48,-10,16,48,-6,16,48,6,20,48,10],
// 2 24 20 48 10 -20 48 10
  [2,24,20,48,10,-20,48,10],
// 2 24 -20 48 10 -20 48 -10
  [2,24,-20,48,10,-20,48,-10],
// 2 24 20 48 -10 20 48 10
  [2,24,20,48,-10,20,48,10],
// 2 24 20 0 10 20 48 10
  [2,24,20,0,10,20,48,10],
// 2 24 -20 0 10 -20 48 10
  [2,24,-20,0,10,-20,48,10],
// 4 16 -20 40 6 -20 48 10 -20 48 -10 -20 40 -10
  [4,16,-20,40,6,-20,48,10,-20,48,-10,-20,40,-10],
// 4 16 -20 48 10 -20 40 6 -20 4 6 -20 0 10
  [4,16,-20,48,10,-20,40,6,-20,4,6,-20,0,10],
// 4 16 -20 0 10 -20 4 6 -20 4 -10 -20 0 -10
  [4,16,-20,0,10,-20,4,6,-20,4,-10,-20,0,-10],
// 4 16 20 48 -10 20 48 10 20 40 6 20 40 -10
  [4,16,20,48,-10,20,48,10,20,40,6,20,40,-10],
// 4 16 20 4 6 20 40 6 20 48 10 20 0 10
  [4,16,20,4,6,20,40,6,20,48,10,20,0,10],
// 4 16 20 4 -10 20 4 6 20 0 10 20 0 -10
  [4,16,20,4,-10,20,4,6,20,0,10,20,0,-10],
// 0 BFC INVERTNEXT
  [0,"BFC","INVERTNEXT"],
// 1 16 0 22 -10 20 0 0 0 0 -18 0 16 0 box3u2p.dat
  [1,16,0,22,-10,20,0,0,0,0,-18,0,16,0, ldraw_lib__box3u2p()],
// 1 16 0 2 0 20 0 0 0 0 -2 0 -10 0 box2-5.dat
  [1,16,0,2,0,20,0,0,0,0,-2,0,-10,0, ldraw_lib__box2_5()],
// 1 16 0 44 -10 -20 0 0 0 0 4 0 1 0 rect3.dat
  [1,16,0,44,-10,-20,0,0,0,0,4,0,1,0, ldraw_lib__rect3()],
// 0
];
module ldraw_lib__s__4864s01(step=0, col=false, unit=2/5, alt=false, line=0.2, solid=!$preview)
    makepoly(ldraw_lib__s__4864s01(), step=step, col=col, unit=unit, alt=alt, line=line, solid=solid);
ldraw_lib__s__4864s01(line=0.2);
// file: ../p/box5-12.scad
use <../lib.scad>
function ldraw_lib__box5_12() = [
// 0 Box with 5 Faces without Any Edges
// 0 Name: box5-12.dat
// 0 Author: Chris Dee [cwdee]
// 0 !LDRAW_ORG Primitive UPDATE 2009-02
// 0 !LICENSE Licensed under CC BY 2.0 and CC BY 4.0 : see CAreadme.txt
// 
// 0 BFC CERTIFY CCW
  [0,"BFC","CERTIFY"],
  [0,"BFC","CCW"],
// 
// 0 !HISTORY 2009-09-03 [PTadmin] Official Update 2009-02
// 
// 
// 4 16 1 1 1 1 1 -1 -1 1 -1 -1 1 1
  [4,16,1,1,1,1,1,-1,-1,1,-1,-1,1,1],
// 4 16 -1 0 1 1 0 1 1 1 1 -1 1 1
  [4,16,-1,0,1,1,0,1,1,1,1,-1,1,1],
// 4 16 -1 0 -1 -1 0 1 -1 1 1 -1 1 -1
  [4,16,-1,0,-1,-1,0,1,-1,1,1,-1,1,-1],
// 4 16 1 0 -1 -1 0 -1 -1 1 -1 1 1 -1
  [4,16,1,0,-1,-1,0,-1,-1,1,-1,1,1,-1],
// 4 16 1 0 1 1 0 -1 1 1 -1 1 1 1
  [4,16,1,0,1,1,0,-1,1,1,-1,1,1,1],
// 0
];
module ldraw_lib__box5_12(step=0, col=false, unit=2/5, alt=false, line=0.2, solid=!$preview)
    makepoly(ldraw_lib__box5_12(), step=step, col=col, unit=unit, alt=alt, line=line, solid=solid);
ldraw_lib__box5_12(line=0.2);
// file: ../p/4-4ndis.scad
use <../lib.scad>
function ldraw_lib__4_4ndis() = [
// 0 Disc Negative 1.0
// 0 Name: 4-4ndis.dat
// 0 Author: James Jessiman
// 0 !LDRAW_ORG Primitive UPDATE 2012-01
// 0 !LICENSE Licensed under CC BY 2.0 and CC BY 4.0 : see CAreadme.txt
// 
// 0 BFC CERTIFY CCW
  [0,"BFC","CERTIFY"],
  [0,"BFC","CCW"],
// 
// 0 !HISTORY 2002-03-23 [sbliss] Added BFC statement; compacted code
// 0 !HISTORY 2002-04-25 [PTadmin] Official Update 2002-02
// 0 !HISTORY 2007-06-24 [PTadmin] Header formatted for Contributor Agreement
// 0 !HISTORY 2008-07-01 [PTadmin] Official Update 2008-01
// 0 !HISTORY 2012-02-16 [Philo] Changed to CCW
// 0 !HISTORY 2012-03-30 [PTadmin] Official Update 2012-01
// 
// 
// 3 16 0.9239 0 0.3827 1 0 0 1 0 1
  [3,16,0.9239,0,0.3827,1,0,0,1,0,1],
// 3 16 0.7071 0 0.7071 0.9239 0 0.3827 1 0 1
  [3,16,0.7071,0,0.7071,0.9239,0,0.3827,1,0,1],
// 3 16 0.3827 0 0.9239 0.7071 0 0.7071 1 0 1
  [3,16,0.3827,0,0.9239,0.7071,0,0.7071,1,0,1],
// 3 16 0 0 1 0.3827 0 0.9239 1 0 1
  [3,16,0,0,1,0.3827,0,0.9239,1,0,1],
// 3 16 -0.3827 0 0.9239 0 0 1 -1 0 1
  [3,16,-0.3827,0,0.9239,0,0,1,-1,0,1],
// 3 16 -0.7071 0 0.7071 -0.3827 0 0.9239 -1 0 1
  [3,16,-0.7071,0,0.7071,-0.3827,0,0.9239,-1,0,1],
// 3 16 -0.9239 0 0.3827 -0.7071 0 0.7071 -1 0 1
  [3,16,-0.9239,0,0.3827,-0.7071,0,0.7071,-1,0,1],
// 3 16 -1 0 0 -0.9239 0 0.3827 -1 0 1
  [3,16,-1,0,0,-0.9239,0,0.3827,-1,0,1],
// 3 16 -0.9239 0 -0.3827 -1 0 0 -1 0 -1
  [3,16,-0.9239,0,-0.3827,-1,0,0,-1,0,-1],
// 3 16 -0.7071 0 -0.7071 -0.9239 0 -0.3827 -1 0 -1
  [3,16,-0.7071,0,-0.7071,-0.9239,0,-0.3827,-1,0,-1],
// 3 16 -0.3827 0 -0.9239 -0.7071 0 -0.7071 -1 0 -1
  [3,16,-0.3827,0,-0.9239,-0.7071,0,-0.7071,-1,0,-1],
// 3 16 0 0 -1 -0.3827 0 -0.9239 -1 0 -1
  [3,16,0,0,-1,-0.3827,0,-0.9239,-1,0,-1],
// 3 16 0.3827 0 -0.9239 0 0 -1 1 0 -1
  [3,16,0.3827,0,-0.9239,0,0,-1,1,0,-1],
// 3 16 0.7071 0 -0.7071 0.3827 0 -0.9239 1 0 -1
  [3,16,0.7071,0,-0.7071,0.3827,0,-0.9239,1,0,-1],
// 3 16 0.9239 0 -0.3827 0.7071 0 -0.7071 1 0 -1
  [3,16,0.9239,0,-0.3827,0.7071,0,-0.7071,1,0,-1],
// 3 16 1 0 0 0.9239 0 -0.3827 1 0 -1
  [3,16,1,0,0,0.9239,0,-0.3827,1,0,-1],
];
module ldraw_lib__4_4ndis(step=0, col=false, unit=2/5, alt=false, line=0.2, solid=!$preview)
    makepoly(ldraw_lib__4_4ndis(), step=step, col=col, unit=unit, alt=alt, line=line, solid=solid);
ldraw_lib__4_4ndis(line=0.2);
// file: ../p/4-4disc.scad
use <../lib.scad>
function ldraw_lib__4_4disc() = [
// 0 Disc 1.0
// 0 Name: 4-4disc.dat
// 0 Author: James Jessiman
// 0 !LDRAW_ORG Primitive UPDATE 2002-02
// 0 !LICENSE Licensed under CC BY 2.0 and CC BY 4.0 : see CAreadme.txt
// 
// 0 BFC CERTIFY CCW
  [0,"BFC","CERTIFY"],
  [0,"BFC","CCW"],
// 
// 0 !HISTORY 1998-12-15 [PTadmin] Official Update 1998-10
// 0 !HISTORY 2002-03-23 [sbliss] Added BFC statement
// 0 !HISTORY 2002-04-25 [PTadmin] Official Update 2002-02
// 0 !HISTORY 2007-06-24 [PTadmin] Header formatted for Contributor Agreement
// 0 !HISTORY 2008-07-01 [PTadmin] Official Update 2008-01
// 
// 
// 3 16 0 0 0 1 0 0 0.9239 0 0.3827
  [3,16,0,0,0,1,0,0,0.9239,0,0.3827],
// 3 16 0 0 0 0.9239 0 0.3827 0.7071 0 0.7071
  [3,16,0,0,0,0.9239,0,0.3827,0.7071,0,0.7071],
// 3 16 0 0 0 0.7071 0 0.7071 0.3827 0 0.9239
  [3,16,0,0,0,0.7071,0,0.7071,0.3827,0,0.9239],
// 3 16 0 0 0 0.3827 0 0.9239 0 0 1
  [3,16,0,0,0,0.3827,0,0.9239,0,0,1],
// 3 16 0 0 0 0 0 1 -0.3827 0 0.9239
  [3,16,0,0,0,0,0,1,-0.3827,0,0.9239],
// 3 16 0 0 0 -0.3827 0 0.9239 -0.7071 0 0.7071
  [3,16,0,0,0,-0.3827,0,0.9239,-0.7071,0,0.7071],
// 3 16 0 0 0 -0.7071 0 0.7071 -0.9239 0 0.3827
  [3,16,0,0,0,-0.7071,0,0.7071,-0.9239,0,0.3827],
// 3 16 0 0 0 -0.9239 0 0.3827 -1 0 -0
  [3,16,0,0,0,-0.9239,0,0.3827,-1,0,-0],
// 3 16 0 0 0 -1 0 -0 -0.9239 0 -0.3827
  [3,16,0,0,0,-1,0,-0,-0.9239,0,-0.3827],
// 3 16 0 0 0 -0.9239 0 -0.3827 -0.7071 0 -0.7071
  [3,16,0,0,0,-0.9239,0,-0.3827,-0.7071,0,-0.7071],
// 3 16 0 0 0 -0.7071 0 -0.7071 -0.3827 0 -0.9239
  [3,16,0,0,0,-0.7071,0,-0.7071,-0.3827,0,-0.9239],
// 3 16 0 0 0 -0.3827 0 -0.9239 0 0 -1
  [3,16,0,0,0,-0.3827,0,-0.9239,0,0,-1],
// 3 16 0 0 0 0 0 -1 0.3827 0 -0.9239
  [3,16,0,0,0,0,0,-1,0.3827,0,-0.9239],
// 3 16 0 0 0 0.3827 0 -0.9239 0.7071 0 -0.7071
  [3,16,0,0,0,0.3827,0,-0.9239,0.7071,0,-0.7071],
// 3 16 0 0 0 0.7071 0 -0.7071 0.9239 0 -0.3827
  [3,16,0,0,0,0.7071,0,-0.7071,0.9239,0,-0.3827],
// 3 16 0 0 0 0.9239 0 -0.3827 1 0 0
  [3,16,0,0,0,0.9239,0,-0.3827,1,0,0],
// 0
];
module ldraw_lib__4_4disc(step=0, col=false, unit=2/5, alt=false, line=0.2, solid=!$preview)
    makepoly(ldraw_lib__4_4disc(), step=step, col=col, unit=unit, alt=alt, line=line, solid=solid);
ldraw_lib__4_4disc(line=0.2);
// file: ../p/1-4ndis.scad
use <../lib.scad>
function ldraw_lib__1_4ndis() = [
// 0 Disc Negative 0.25
// 0 Name: 1-4ndis.dat
// 0 Author: James Jessiman
// 0 !LDRAW_ORG Primitive UPDATE 2012-01
// 0 !LICENSE Licensed under CC BY 2.0 and CC BY 4.0 : see CAreadme.txt
// 
// 0 BFC CERTIFY CCW
  [0,"BFC","CERTIFY"],
  [0,"BFC","CCW"],
// 
// 0 !HISTORY 2002-03-23 [sbliss] Added BFC Statement
// 0 !HISTORY 2002-04-25 [PTadmin] Official Update 2002-02
// 0 !HISTORY 2007-06-22 [PTadmin] Header formatted for Contributor Agreement
// 0 !HISTORY 2008-07-01 [PTadmin] Official Update 2008-01
// 0 !HISTORY 2012-02-16 [Philo] Changed to CCW
// 0 !HISTORY 2012-03-30 [PTadmin] Official Update 2012-01
// 
// 
// 3 16 0.9239 0 0.3827 1 0 0 1 0 1
  [3,16,0.9239,0,0.3827,1,0,0,1,0,1],
// 3 16 0.7071 0 0.7071 0.9239 0 0.3827 1 0 1
  [3,16,0.7071,0,0.7071,0.9239,0,0.3827,1,0,1],
// 3 16 0.3827 0 0.9239 0.7071 0 0.7071 1 0 1
  [3,16,0.3827,0,0.9239,0.7071,0,0.7071,1,0,1],
// 3 16 0 0 1 0.3827 0 0.9239 1 0 1
  [3,16,0,0,1,0.3827,0,0.9239,1,0,1],
];
module ldraw_lib__1_4ndis(step=0, col=false, unit=2/5, alt=false, line=0.2, solid=!$preview)
    makepoly(ldraw_lib__1_4ndis(), step=step, col=col, unit=unit, alt=alt, line=line, solid=solid);
ldraw_lib__1_4ndis(line=0.2);
// file: ../p/1-4chrd.scad
use <../lib.scad>
$fa=1; $fs=0.2;
function ldraw_lib__1_4chrd(realsolid=false) = [
// 0 Chord 0.25
// 0 Name: 1-4chrd.dat
// 0 Author: Tony Hafner [hafhead]
// 0 !LDRAW_ORG Primitive UPDATE 2012-02
// 0 !LICENSE Licensed under CC BY 2.0 and CC BY 4.0 : see CAreadme.txt
// 
// 0 BFC CERTIFY CCW
  [0,"BFC","CERTIFY"],
  [0,"BFC","CCW"],
// 
// 0 !HISTORY 2004-04-22 [PTadmin] Official Update 2004-02
// 0 !HISTORY 2007-10-09 [PTadmin] Header formatted for Contributor Agreement
// 0 !HISTORY 2008-07-01 [PTadmin] Official Update 2008-01
// 0 !HISTORY 2012-08-02 [MMR1988] Re-creation with PrimGen2 and Rectifier
// 0 !HISTORY 2012-08-09 [PTadmin] Official Update 2012-02
// 
// 
// 4 16 0.9239 0 0.3827 0.3827 0 0.9239 0 0 1 1 0 0
  [4,16,0.9239,0,0.3827,0.3827,0,0.9239,0,0,1,1,0,0],
// 3 16 0.7071 0 0.7071 0.3827 0 0.9239 0.9239 0 0.3827
  [3,16,0.7071,0,0.7071,0.3827,0,0.9239,0.9239,0,0.3827],
];
module ldraw_lib__1_4chrd(step=0, col=false, unit=2/5, alt=false, line=0.2, solid=!$preview)
    makepoly(ldraw_lib__1_4chrd(solid), step=step, col=col, unit=unit, alt=alt, line=line, solid=solid);
ldraw_lib__1_4chrd(line=0.2);
// file: 4864a.scad
use <../lib.scad>
use <s/4864s01.scad>
use <../p/stud.scad>
function ldraw_lib__4864a() = [
// 0 Panel  1 x  2 x  2 with Solid Studs
// 0 Name: 4864a.dat
// 0 Author: James Jessiman
// 0 !LDRAW_ORG Part UPDATE 2026-08
// 0 !LICENSE Licensed under CC BY 4.0 : see CAreadme.txt
// 
// 0 BFC CERTIFY CCW
  [0,"BFC","CERTIFY"],
  [0,"BFC","CCW"],
// 
// 0 !CATEGORY Panel
// 
// 0 !HISTORY 2004-04-25 [cwdee] Created solid stud version
// 0 !HISTORY 2004-09-15 [PTadmin] Official Update 2004-03
// 0 !HISTORY 2007-07-09 [PTadmin] Header formatted for Contributor Agreement
// 0 !HISTORY 2008-07-01 [PTadmin] Official Update 2008-01
// 0 !HISTORY 2025-09-27 [OrionP] Changed winding to CCW
// 0 !HISTORY 2025-09-29 [OrionP] Official Update 2025-09
// 0 !HISTORY 2026-08-31 [OrionP] Minor header edits
// 0 !HISTORY 2026-08-31 [OrionP] Official Update 2026-08
// 
// 1 16 0 0 0 1 0 0 0 1 0 0 0 1 s\4864s01.dat
  [1,16,0,0,0,1,0,0,0,1,0,0,0,1, ldraw_lib__s__4864s01()],
// 
// 4 16 20 0 10 20 48 10 -20 48 10 -20 0 10
  [4,16,20,0,10,20,48,10,-20,48,10,-20,0,10],
// 1 16 10 0 0 1 0 0 0 1 0 0 0 1 stud.dat
  [1,16,10,0,0,1,0,0,0,1,0,0,0,1, ldraw_lib__stud()],
// 1 16 -10 0 0 1 0 0 0 1 0 0 0 1 stud.dat
  [1,16,-10,0,0,1,0,0,0,1,0,0,0,1, ldraw_lib__stud()],
// 0
];
module ldraw_lib__4864a(step=0, col=false, unit=2/5, alt=false, line=0.2, solid=!$preview)
    makepoly(ldraw_lib__4864a(), step=step, col=col, unit=unit, alt=alt, line=line, solid=solid);
ldraw_lib__4864a(line=0.2);
// main file
use <../lib.scad>
use <196695b.scad>
use <4864a.scad>
function ldraw_lib__4864ad01() = [
// 0 Panel  1 x  2 x  2 with Four Red Circles, Eight White Rectangles and Four Yellow Circles Sticker
// 0 Name: 4864ad01.dat
// 0 Author: Takeshi Takahashi [RainbowDolphin]
// 0 !LDRAW_ORG Shortcut UPDATE 2024-07
// 0 !LICENSE Licensed under CC BY 4.0 : see CAreadme.txt
// 
// 0 BFC CERTIFY CCW
  [0,"BFC","CERTIFY"],
  [0,"BFC","CCW"],
// 
// 0 !CATEGORY Sticker Shortcut
// 0 !KEYWORDS Bricklink 4864apb001, Fire engine, Set 6385
// 
// 0 !HISTORY 2024-08-26 [OrionP] Official Update 2024-07
// 
// 1 16 0 0 0 1 0 0 0 1 0 0 0 1 4864a.dat
  [1,16,0,0,0,1,0,0,0,1,0,0,0,1, ldraw_lib__4864a()],
// 1 16 0 24 10 -1 0 0 0 0 -1 0 -1 0 196695b.dat
  [1,16,0,24,10,-1,0,0,0,0,-1,0,-1,0, ldraw_lib__196695b()],
];
module ldraw_lib__4864ad01(step=0, col=false, unit=2/5, alt=false, line=0.2, solid=!$preview)
    makepoly(ldraw_lib__4864ad01(), step=step, col=col, unit=unit, alt=alt, line=line, solid=solid);
ldraw_lib__4864ad01(line=0.2);
